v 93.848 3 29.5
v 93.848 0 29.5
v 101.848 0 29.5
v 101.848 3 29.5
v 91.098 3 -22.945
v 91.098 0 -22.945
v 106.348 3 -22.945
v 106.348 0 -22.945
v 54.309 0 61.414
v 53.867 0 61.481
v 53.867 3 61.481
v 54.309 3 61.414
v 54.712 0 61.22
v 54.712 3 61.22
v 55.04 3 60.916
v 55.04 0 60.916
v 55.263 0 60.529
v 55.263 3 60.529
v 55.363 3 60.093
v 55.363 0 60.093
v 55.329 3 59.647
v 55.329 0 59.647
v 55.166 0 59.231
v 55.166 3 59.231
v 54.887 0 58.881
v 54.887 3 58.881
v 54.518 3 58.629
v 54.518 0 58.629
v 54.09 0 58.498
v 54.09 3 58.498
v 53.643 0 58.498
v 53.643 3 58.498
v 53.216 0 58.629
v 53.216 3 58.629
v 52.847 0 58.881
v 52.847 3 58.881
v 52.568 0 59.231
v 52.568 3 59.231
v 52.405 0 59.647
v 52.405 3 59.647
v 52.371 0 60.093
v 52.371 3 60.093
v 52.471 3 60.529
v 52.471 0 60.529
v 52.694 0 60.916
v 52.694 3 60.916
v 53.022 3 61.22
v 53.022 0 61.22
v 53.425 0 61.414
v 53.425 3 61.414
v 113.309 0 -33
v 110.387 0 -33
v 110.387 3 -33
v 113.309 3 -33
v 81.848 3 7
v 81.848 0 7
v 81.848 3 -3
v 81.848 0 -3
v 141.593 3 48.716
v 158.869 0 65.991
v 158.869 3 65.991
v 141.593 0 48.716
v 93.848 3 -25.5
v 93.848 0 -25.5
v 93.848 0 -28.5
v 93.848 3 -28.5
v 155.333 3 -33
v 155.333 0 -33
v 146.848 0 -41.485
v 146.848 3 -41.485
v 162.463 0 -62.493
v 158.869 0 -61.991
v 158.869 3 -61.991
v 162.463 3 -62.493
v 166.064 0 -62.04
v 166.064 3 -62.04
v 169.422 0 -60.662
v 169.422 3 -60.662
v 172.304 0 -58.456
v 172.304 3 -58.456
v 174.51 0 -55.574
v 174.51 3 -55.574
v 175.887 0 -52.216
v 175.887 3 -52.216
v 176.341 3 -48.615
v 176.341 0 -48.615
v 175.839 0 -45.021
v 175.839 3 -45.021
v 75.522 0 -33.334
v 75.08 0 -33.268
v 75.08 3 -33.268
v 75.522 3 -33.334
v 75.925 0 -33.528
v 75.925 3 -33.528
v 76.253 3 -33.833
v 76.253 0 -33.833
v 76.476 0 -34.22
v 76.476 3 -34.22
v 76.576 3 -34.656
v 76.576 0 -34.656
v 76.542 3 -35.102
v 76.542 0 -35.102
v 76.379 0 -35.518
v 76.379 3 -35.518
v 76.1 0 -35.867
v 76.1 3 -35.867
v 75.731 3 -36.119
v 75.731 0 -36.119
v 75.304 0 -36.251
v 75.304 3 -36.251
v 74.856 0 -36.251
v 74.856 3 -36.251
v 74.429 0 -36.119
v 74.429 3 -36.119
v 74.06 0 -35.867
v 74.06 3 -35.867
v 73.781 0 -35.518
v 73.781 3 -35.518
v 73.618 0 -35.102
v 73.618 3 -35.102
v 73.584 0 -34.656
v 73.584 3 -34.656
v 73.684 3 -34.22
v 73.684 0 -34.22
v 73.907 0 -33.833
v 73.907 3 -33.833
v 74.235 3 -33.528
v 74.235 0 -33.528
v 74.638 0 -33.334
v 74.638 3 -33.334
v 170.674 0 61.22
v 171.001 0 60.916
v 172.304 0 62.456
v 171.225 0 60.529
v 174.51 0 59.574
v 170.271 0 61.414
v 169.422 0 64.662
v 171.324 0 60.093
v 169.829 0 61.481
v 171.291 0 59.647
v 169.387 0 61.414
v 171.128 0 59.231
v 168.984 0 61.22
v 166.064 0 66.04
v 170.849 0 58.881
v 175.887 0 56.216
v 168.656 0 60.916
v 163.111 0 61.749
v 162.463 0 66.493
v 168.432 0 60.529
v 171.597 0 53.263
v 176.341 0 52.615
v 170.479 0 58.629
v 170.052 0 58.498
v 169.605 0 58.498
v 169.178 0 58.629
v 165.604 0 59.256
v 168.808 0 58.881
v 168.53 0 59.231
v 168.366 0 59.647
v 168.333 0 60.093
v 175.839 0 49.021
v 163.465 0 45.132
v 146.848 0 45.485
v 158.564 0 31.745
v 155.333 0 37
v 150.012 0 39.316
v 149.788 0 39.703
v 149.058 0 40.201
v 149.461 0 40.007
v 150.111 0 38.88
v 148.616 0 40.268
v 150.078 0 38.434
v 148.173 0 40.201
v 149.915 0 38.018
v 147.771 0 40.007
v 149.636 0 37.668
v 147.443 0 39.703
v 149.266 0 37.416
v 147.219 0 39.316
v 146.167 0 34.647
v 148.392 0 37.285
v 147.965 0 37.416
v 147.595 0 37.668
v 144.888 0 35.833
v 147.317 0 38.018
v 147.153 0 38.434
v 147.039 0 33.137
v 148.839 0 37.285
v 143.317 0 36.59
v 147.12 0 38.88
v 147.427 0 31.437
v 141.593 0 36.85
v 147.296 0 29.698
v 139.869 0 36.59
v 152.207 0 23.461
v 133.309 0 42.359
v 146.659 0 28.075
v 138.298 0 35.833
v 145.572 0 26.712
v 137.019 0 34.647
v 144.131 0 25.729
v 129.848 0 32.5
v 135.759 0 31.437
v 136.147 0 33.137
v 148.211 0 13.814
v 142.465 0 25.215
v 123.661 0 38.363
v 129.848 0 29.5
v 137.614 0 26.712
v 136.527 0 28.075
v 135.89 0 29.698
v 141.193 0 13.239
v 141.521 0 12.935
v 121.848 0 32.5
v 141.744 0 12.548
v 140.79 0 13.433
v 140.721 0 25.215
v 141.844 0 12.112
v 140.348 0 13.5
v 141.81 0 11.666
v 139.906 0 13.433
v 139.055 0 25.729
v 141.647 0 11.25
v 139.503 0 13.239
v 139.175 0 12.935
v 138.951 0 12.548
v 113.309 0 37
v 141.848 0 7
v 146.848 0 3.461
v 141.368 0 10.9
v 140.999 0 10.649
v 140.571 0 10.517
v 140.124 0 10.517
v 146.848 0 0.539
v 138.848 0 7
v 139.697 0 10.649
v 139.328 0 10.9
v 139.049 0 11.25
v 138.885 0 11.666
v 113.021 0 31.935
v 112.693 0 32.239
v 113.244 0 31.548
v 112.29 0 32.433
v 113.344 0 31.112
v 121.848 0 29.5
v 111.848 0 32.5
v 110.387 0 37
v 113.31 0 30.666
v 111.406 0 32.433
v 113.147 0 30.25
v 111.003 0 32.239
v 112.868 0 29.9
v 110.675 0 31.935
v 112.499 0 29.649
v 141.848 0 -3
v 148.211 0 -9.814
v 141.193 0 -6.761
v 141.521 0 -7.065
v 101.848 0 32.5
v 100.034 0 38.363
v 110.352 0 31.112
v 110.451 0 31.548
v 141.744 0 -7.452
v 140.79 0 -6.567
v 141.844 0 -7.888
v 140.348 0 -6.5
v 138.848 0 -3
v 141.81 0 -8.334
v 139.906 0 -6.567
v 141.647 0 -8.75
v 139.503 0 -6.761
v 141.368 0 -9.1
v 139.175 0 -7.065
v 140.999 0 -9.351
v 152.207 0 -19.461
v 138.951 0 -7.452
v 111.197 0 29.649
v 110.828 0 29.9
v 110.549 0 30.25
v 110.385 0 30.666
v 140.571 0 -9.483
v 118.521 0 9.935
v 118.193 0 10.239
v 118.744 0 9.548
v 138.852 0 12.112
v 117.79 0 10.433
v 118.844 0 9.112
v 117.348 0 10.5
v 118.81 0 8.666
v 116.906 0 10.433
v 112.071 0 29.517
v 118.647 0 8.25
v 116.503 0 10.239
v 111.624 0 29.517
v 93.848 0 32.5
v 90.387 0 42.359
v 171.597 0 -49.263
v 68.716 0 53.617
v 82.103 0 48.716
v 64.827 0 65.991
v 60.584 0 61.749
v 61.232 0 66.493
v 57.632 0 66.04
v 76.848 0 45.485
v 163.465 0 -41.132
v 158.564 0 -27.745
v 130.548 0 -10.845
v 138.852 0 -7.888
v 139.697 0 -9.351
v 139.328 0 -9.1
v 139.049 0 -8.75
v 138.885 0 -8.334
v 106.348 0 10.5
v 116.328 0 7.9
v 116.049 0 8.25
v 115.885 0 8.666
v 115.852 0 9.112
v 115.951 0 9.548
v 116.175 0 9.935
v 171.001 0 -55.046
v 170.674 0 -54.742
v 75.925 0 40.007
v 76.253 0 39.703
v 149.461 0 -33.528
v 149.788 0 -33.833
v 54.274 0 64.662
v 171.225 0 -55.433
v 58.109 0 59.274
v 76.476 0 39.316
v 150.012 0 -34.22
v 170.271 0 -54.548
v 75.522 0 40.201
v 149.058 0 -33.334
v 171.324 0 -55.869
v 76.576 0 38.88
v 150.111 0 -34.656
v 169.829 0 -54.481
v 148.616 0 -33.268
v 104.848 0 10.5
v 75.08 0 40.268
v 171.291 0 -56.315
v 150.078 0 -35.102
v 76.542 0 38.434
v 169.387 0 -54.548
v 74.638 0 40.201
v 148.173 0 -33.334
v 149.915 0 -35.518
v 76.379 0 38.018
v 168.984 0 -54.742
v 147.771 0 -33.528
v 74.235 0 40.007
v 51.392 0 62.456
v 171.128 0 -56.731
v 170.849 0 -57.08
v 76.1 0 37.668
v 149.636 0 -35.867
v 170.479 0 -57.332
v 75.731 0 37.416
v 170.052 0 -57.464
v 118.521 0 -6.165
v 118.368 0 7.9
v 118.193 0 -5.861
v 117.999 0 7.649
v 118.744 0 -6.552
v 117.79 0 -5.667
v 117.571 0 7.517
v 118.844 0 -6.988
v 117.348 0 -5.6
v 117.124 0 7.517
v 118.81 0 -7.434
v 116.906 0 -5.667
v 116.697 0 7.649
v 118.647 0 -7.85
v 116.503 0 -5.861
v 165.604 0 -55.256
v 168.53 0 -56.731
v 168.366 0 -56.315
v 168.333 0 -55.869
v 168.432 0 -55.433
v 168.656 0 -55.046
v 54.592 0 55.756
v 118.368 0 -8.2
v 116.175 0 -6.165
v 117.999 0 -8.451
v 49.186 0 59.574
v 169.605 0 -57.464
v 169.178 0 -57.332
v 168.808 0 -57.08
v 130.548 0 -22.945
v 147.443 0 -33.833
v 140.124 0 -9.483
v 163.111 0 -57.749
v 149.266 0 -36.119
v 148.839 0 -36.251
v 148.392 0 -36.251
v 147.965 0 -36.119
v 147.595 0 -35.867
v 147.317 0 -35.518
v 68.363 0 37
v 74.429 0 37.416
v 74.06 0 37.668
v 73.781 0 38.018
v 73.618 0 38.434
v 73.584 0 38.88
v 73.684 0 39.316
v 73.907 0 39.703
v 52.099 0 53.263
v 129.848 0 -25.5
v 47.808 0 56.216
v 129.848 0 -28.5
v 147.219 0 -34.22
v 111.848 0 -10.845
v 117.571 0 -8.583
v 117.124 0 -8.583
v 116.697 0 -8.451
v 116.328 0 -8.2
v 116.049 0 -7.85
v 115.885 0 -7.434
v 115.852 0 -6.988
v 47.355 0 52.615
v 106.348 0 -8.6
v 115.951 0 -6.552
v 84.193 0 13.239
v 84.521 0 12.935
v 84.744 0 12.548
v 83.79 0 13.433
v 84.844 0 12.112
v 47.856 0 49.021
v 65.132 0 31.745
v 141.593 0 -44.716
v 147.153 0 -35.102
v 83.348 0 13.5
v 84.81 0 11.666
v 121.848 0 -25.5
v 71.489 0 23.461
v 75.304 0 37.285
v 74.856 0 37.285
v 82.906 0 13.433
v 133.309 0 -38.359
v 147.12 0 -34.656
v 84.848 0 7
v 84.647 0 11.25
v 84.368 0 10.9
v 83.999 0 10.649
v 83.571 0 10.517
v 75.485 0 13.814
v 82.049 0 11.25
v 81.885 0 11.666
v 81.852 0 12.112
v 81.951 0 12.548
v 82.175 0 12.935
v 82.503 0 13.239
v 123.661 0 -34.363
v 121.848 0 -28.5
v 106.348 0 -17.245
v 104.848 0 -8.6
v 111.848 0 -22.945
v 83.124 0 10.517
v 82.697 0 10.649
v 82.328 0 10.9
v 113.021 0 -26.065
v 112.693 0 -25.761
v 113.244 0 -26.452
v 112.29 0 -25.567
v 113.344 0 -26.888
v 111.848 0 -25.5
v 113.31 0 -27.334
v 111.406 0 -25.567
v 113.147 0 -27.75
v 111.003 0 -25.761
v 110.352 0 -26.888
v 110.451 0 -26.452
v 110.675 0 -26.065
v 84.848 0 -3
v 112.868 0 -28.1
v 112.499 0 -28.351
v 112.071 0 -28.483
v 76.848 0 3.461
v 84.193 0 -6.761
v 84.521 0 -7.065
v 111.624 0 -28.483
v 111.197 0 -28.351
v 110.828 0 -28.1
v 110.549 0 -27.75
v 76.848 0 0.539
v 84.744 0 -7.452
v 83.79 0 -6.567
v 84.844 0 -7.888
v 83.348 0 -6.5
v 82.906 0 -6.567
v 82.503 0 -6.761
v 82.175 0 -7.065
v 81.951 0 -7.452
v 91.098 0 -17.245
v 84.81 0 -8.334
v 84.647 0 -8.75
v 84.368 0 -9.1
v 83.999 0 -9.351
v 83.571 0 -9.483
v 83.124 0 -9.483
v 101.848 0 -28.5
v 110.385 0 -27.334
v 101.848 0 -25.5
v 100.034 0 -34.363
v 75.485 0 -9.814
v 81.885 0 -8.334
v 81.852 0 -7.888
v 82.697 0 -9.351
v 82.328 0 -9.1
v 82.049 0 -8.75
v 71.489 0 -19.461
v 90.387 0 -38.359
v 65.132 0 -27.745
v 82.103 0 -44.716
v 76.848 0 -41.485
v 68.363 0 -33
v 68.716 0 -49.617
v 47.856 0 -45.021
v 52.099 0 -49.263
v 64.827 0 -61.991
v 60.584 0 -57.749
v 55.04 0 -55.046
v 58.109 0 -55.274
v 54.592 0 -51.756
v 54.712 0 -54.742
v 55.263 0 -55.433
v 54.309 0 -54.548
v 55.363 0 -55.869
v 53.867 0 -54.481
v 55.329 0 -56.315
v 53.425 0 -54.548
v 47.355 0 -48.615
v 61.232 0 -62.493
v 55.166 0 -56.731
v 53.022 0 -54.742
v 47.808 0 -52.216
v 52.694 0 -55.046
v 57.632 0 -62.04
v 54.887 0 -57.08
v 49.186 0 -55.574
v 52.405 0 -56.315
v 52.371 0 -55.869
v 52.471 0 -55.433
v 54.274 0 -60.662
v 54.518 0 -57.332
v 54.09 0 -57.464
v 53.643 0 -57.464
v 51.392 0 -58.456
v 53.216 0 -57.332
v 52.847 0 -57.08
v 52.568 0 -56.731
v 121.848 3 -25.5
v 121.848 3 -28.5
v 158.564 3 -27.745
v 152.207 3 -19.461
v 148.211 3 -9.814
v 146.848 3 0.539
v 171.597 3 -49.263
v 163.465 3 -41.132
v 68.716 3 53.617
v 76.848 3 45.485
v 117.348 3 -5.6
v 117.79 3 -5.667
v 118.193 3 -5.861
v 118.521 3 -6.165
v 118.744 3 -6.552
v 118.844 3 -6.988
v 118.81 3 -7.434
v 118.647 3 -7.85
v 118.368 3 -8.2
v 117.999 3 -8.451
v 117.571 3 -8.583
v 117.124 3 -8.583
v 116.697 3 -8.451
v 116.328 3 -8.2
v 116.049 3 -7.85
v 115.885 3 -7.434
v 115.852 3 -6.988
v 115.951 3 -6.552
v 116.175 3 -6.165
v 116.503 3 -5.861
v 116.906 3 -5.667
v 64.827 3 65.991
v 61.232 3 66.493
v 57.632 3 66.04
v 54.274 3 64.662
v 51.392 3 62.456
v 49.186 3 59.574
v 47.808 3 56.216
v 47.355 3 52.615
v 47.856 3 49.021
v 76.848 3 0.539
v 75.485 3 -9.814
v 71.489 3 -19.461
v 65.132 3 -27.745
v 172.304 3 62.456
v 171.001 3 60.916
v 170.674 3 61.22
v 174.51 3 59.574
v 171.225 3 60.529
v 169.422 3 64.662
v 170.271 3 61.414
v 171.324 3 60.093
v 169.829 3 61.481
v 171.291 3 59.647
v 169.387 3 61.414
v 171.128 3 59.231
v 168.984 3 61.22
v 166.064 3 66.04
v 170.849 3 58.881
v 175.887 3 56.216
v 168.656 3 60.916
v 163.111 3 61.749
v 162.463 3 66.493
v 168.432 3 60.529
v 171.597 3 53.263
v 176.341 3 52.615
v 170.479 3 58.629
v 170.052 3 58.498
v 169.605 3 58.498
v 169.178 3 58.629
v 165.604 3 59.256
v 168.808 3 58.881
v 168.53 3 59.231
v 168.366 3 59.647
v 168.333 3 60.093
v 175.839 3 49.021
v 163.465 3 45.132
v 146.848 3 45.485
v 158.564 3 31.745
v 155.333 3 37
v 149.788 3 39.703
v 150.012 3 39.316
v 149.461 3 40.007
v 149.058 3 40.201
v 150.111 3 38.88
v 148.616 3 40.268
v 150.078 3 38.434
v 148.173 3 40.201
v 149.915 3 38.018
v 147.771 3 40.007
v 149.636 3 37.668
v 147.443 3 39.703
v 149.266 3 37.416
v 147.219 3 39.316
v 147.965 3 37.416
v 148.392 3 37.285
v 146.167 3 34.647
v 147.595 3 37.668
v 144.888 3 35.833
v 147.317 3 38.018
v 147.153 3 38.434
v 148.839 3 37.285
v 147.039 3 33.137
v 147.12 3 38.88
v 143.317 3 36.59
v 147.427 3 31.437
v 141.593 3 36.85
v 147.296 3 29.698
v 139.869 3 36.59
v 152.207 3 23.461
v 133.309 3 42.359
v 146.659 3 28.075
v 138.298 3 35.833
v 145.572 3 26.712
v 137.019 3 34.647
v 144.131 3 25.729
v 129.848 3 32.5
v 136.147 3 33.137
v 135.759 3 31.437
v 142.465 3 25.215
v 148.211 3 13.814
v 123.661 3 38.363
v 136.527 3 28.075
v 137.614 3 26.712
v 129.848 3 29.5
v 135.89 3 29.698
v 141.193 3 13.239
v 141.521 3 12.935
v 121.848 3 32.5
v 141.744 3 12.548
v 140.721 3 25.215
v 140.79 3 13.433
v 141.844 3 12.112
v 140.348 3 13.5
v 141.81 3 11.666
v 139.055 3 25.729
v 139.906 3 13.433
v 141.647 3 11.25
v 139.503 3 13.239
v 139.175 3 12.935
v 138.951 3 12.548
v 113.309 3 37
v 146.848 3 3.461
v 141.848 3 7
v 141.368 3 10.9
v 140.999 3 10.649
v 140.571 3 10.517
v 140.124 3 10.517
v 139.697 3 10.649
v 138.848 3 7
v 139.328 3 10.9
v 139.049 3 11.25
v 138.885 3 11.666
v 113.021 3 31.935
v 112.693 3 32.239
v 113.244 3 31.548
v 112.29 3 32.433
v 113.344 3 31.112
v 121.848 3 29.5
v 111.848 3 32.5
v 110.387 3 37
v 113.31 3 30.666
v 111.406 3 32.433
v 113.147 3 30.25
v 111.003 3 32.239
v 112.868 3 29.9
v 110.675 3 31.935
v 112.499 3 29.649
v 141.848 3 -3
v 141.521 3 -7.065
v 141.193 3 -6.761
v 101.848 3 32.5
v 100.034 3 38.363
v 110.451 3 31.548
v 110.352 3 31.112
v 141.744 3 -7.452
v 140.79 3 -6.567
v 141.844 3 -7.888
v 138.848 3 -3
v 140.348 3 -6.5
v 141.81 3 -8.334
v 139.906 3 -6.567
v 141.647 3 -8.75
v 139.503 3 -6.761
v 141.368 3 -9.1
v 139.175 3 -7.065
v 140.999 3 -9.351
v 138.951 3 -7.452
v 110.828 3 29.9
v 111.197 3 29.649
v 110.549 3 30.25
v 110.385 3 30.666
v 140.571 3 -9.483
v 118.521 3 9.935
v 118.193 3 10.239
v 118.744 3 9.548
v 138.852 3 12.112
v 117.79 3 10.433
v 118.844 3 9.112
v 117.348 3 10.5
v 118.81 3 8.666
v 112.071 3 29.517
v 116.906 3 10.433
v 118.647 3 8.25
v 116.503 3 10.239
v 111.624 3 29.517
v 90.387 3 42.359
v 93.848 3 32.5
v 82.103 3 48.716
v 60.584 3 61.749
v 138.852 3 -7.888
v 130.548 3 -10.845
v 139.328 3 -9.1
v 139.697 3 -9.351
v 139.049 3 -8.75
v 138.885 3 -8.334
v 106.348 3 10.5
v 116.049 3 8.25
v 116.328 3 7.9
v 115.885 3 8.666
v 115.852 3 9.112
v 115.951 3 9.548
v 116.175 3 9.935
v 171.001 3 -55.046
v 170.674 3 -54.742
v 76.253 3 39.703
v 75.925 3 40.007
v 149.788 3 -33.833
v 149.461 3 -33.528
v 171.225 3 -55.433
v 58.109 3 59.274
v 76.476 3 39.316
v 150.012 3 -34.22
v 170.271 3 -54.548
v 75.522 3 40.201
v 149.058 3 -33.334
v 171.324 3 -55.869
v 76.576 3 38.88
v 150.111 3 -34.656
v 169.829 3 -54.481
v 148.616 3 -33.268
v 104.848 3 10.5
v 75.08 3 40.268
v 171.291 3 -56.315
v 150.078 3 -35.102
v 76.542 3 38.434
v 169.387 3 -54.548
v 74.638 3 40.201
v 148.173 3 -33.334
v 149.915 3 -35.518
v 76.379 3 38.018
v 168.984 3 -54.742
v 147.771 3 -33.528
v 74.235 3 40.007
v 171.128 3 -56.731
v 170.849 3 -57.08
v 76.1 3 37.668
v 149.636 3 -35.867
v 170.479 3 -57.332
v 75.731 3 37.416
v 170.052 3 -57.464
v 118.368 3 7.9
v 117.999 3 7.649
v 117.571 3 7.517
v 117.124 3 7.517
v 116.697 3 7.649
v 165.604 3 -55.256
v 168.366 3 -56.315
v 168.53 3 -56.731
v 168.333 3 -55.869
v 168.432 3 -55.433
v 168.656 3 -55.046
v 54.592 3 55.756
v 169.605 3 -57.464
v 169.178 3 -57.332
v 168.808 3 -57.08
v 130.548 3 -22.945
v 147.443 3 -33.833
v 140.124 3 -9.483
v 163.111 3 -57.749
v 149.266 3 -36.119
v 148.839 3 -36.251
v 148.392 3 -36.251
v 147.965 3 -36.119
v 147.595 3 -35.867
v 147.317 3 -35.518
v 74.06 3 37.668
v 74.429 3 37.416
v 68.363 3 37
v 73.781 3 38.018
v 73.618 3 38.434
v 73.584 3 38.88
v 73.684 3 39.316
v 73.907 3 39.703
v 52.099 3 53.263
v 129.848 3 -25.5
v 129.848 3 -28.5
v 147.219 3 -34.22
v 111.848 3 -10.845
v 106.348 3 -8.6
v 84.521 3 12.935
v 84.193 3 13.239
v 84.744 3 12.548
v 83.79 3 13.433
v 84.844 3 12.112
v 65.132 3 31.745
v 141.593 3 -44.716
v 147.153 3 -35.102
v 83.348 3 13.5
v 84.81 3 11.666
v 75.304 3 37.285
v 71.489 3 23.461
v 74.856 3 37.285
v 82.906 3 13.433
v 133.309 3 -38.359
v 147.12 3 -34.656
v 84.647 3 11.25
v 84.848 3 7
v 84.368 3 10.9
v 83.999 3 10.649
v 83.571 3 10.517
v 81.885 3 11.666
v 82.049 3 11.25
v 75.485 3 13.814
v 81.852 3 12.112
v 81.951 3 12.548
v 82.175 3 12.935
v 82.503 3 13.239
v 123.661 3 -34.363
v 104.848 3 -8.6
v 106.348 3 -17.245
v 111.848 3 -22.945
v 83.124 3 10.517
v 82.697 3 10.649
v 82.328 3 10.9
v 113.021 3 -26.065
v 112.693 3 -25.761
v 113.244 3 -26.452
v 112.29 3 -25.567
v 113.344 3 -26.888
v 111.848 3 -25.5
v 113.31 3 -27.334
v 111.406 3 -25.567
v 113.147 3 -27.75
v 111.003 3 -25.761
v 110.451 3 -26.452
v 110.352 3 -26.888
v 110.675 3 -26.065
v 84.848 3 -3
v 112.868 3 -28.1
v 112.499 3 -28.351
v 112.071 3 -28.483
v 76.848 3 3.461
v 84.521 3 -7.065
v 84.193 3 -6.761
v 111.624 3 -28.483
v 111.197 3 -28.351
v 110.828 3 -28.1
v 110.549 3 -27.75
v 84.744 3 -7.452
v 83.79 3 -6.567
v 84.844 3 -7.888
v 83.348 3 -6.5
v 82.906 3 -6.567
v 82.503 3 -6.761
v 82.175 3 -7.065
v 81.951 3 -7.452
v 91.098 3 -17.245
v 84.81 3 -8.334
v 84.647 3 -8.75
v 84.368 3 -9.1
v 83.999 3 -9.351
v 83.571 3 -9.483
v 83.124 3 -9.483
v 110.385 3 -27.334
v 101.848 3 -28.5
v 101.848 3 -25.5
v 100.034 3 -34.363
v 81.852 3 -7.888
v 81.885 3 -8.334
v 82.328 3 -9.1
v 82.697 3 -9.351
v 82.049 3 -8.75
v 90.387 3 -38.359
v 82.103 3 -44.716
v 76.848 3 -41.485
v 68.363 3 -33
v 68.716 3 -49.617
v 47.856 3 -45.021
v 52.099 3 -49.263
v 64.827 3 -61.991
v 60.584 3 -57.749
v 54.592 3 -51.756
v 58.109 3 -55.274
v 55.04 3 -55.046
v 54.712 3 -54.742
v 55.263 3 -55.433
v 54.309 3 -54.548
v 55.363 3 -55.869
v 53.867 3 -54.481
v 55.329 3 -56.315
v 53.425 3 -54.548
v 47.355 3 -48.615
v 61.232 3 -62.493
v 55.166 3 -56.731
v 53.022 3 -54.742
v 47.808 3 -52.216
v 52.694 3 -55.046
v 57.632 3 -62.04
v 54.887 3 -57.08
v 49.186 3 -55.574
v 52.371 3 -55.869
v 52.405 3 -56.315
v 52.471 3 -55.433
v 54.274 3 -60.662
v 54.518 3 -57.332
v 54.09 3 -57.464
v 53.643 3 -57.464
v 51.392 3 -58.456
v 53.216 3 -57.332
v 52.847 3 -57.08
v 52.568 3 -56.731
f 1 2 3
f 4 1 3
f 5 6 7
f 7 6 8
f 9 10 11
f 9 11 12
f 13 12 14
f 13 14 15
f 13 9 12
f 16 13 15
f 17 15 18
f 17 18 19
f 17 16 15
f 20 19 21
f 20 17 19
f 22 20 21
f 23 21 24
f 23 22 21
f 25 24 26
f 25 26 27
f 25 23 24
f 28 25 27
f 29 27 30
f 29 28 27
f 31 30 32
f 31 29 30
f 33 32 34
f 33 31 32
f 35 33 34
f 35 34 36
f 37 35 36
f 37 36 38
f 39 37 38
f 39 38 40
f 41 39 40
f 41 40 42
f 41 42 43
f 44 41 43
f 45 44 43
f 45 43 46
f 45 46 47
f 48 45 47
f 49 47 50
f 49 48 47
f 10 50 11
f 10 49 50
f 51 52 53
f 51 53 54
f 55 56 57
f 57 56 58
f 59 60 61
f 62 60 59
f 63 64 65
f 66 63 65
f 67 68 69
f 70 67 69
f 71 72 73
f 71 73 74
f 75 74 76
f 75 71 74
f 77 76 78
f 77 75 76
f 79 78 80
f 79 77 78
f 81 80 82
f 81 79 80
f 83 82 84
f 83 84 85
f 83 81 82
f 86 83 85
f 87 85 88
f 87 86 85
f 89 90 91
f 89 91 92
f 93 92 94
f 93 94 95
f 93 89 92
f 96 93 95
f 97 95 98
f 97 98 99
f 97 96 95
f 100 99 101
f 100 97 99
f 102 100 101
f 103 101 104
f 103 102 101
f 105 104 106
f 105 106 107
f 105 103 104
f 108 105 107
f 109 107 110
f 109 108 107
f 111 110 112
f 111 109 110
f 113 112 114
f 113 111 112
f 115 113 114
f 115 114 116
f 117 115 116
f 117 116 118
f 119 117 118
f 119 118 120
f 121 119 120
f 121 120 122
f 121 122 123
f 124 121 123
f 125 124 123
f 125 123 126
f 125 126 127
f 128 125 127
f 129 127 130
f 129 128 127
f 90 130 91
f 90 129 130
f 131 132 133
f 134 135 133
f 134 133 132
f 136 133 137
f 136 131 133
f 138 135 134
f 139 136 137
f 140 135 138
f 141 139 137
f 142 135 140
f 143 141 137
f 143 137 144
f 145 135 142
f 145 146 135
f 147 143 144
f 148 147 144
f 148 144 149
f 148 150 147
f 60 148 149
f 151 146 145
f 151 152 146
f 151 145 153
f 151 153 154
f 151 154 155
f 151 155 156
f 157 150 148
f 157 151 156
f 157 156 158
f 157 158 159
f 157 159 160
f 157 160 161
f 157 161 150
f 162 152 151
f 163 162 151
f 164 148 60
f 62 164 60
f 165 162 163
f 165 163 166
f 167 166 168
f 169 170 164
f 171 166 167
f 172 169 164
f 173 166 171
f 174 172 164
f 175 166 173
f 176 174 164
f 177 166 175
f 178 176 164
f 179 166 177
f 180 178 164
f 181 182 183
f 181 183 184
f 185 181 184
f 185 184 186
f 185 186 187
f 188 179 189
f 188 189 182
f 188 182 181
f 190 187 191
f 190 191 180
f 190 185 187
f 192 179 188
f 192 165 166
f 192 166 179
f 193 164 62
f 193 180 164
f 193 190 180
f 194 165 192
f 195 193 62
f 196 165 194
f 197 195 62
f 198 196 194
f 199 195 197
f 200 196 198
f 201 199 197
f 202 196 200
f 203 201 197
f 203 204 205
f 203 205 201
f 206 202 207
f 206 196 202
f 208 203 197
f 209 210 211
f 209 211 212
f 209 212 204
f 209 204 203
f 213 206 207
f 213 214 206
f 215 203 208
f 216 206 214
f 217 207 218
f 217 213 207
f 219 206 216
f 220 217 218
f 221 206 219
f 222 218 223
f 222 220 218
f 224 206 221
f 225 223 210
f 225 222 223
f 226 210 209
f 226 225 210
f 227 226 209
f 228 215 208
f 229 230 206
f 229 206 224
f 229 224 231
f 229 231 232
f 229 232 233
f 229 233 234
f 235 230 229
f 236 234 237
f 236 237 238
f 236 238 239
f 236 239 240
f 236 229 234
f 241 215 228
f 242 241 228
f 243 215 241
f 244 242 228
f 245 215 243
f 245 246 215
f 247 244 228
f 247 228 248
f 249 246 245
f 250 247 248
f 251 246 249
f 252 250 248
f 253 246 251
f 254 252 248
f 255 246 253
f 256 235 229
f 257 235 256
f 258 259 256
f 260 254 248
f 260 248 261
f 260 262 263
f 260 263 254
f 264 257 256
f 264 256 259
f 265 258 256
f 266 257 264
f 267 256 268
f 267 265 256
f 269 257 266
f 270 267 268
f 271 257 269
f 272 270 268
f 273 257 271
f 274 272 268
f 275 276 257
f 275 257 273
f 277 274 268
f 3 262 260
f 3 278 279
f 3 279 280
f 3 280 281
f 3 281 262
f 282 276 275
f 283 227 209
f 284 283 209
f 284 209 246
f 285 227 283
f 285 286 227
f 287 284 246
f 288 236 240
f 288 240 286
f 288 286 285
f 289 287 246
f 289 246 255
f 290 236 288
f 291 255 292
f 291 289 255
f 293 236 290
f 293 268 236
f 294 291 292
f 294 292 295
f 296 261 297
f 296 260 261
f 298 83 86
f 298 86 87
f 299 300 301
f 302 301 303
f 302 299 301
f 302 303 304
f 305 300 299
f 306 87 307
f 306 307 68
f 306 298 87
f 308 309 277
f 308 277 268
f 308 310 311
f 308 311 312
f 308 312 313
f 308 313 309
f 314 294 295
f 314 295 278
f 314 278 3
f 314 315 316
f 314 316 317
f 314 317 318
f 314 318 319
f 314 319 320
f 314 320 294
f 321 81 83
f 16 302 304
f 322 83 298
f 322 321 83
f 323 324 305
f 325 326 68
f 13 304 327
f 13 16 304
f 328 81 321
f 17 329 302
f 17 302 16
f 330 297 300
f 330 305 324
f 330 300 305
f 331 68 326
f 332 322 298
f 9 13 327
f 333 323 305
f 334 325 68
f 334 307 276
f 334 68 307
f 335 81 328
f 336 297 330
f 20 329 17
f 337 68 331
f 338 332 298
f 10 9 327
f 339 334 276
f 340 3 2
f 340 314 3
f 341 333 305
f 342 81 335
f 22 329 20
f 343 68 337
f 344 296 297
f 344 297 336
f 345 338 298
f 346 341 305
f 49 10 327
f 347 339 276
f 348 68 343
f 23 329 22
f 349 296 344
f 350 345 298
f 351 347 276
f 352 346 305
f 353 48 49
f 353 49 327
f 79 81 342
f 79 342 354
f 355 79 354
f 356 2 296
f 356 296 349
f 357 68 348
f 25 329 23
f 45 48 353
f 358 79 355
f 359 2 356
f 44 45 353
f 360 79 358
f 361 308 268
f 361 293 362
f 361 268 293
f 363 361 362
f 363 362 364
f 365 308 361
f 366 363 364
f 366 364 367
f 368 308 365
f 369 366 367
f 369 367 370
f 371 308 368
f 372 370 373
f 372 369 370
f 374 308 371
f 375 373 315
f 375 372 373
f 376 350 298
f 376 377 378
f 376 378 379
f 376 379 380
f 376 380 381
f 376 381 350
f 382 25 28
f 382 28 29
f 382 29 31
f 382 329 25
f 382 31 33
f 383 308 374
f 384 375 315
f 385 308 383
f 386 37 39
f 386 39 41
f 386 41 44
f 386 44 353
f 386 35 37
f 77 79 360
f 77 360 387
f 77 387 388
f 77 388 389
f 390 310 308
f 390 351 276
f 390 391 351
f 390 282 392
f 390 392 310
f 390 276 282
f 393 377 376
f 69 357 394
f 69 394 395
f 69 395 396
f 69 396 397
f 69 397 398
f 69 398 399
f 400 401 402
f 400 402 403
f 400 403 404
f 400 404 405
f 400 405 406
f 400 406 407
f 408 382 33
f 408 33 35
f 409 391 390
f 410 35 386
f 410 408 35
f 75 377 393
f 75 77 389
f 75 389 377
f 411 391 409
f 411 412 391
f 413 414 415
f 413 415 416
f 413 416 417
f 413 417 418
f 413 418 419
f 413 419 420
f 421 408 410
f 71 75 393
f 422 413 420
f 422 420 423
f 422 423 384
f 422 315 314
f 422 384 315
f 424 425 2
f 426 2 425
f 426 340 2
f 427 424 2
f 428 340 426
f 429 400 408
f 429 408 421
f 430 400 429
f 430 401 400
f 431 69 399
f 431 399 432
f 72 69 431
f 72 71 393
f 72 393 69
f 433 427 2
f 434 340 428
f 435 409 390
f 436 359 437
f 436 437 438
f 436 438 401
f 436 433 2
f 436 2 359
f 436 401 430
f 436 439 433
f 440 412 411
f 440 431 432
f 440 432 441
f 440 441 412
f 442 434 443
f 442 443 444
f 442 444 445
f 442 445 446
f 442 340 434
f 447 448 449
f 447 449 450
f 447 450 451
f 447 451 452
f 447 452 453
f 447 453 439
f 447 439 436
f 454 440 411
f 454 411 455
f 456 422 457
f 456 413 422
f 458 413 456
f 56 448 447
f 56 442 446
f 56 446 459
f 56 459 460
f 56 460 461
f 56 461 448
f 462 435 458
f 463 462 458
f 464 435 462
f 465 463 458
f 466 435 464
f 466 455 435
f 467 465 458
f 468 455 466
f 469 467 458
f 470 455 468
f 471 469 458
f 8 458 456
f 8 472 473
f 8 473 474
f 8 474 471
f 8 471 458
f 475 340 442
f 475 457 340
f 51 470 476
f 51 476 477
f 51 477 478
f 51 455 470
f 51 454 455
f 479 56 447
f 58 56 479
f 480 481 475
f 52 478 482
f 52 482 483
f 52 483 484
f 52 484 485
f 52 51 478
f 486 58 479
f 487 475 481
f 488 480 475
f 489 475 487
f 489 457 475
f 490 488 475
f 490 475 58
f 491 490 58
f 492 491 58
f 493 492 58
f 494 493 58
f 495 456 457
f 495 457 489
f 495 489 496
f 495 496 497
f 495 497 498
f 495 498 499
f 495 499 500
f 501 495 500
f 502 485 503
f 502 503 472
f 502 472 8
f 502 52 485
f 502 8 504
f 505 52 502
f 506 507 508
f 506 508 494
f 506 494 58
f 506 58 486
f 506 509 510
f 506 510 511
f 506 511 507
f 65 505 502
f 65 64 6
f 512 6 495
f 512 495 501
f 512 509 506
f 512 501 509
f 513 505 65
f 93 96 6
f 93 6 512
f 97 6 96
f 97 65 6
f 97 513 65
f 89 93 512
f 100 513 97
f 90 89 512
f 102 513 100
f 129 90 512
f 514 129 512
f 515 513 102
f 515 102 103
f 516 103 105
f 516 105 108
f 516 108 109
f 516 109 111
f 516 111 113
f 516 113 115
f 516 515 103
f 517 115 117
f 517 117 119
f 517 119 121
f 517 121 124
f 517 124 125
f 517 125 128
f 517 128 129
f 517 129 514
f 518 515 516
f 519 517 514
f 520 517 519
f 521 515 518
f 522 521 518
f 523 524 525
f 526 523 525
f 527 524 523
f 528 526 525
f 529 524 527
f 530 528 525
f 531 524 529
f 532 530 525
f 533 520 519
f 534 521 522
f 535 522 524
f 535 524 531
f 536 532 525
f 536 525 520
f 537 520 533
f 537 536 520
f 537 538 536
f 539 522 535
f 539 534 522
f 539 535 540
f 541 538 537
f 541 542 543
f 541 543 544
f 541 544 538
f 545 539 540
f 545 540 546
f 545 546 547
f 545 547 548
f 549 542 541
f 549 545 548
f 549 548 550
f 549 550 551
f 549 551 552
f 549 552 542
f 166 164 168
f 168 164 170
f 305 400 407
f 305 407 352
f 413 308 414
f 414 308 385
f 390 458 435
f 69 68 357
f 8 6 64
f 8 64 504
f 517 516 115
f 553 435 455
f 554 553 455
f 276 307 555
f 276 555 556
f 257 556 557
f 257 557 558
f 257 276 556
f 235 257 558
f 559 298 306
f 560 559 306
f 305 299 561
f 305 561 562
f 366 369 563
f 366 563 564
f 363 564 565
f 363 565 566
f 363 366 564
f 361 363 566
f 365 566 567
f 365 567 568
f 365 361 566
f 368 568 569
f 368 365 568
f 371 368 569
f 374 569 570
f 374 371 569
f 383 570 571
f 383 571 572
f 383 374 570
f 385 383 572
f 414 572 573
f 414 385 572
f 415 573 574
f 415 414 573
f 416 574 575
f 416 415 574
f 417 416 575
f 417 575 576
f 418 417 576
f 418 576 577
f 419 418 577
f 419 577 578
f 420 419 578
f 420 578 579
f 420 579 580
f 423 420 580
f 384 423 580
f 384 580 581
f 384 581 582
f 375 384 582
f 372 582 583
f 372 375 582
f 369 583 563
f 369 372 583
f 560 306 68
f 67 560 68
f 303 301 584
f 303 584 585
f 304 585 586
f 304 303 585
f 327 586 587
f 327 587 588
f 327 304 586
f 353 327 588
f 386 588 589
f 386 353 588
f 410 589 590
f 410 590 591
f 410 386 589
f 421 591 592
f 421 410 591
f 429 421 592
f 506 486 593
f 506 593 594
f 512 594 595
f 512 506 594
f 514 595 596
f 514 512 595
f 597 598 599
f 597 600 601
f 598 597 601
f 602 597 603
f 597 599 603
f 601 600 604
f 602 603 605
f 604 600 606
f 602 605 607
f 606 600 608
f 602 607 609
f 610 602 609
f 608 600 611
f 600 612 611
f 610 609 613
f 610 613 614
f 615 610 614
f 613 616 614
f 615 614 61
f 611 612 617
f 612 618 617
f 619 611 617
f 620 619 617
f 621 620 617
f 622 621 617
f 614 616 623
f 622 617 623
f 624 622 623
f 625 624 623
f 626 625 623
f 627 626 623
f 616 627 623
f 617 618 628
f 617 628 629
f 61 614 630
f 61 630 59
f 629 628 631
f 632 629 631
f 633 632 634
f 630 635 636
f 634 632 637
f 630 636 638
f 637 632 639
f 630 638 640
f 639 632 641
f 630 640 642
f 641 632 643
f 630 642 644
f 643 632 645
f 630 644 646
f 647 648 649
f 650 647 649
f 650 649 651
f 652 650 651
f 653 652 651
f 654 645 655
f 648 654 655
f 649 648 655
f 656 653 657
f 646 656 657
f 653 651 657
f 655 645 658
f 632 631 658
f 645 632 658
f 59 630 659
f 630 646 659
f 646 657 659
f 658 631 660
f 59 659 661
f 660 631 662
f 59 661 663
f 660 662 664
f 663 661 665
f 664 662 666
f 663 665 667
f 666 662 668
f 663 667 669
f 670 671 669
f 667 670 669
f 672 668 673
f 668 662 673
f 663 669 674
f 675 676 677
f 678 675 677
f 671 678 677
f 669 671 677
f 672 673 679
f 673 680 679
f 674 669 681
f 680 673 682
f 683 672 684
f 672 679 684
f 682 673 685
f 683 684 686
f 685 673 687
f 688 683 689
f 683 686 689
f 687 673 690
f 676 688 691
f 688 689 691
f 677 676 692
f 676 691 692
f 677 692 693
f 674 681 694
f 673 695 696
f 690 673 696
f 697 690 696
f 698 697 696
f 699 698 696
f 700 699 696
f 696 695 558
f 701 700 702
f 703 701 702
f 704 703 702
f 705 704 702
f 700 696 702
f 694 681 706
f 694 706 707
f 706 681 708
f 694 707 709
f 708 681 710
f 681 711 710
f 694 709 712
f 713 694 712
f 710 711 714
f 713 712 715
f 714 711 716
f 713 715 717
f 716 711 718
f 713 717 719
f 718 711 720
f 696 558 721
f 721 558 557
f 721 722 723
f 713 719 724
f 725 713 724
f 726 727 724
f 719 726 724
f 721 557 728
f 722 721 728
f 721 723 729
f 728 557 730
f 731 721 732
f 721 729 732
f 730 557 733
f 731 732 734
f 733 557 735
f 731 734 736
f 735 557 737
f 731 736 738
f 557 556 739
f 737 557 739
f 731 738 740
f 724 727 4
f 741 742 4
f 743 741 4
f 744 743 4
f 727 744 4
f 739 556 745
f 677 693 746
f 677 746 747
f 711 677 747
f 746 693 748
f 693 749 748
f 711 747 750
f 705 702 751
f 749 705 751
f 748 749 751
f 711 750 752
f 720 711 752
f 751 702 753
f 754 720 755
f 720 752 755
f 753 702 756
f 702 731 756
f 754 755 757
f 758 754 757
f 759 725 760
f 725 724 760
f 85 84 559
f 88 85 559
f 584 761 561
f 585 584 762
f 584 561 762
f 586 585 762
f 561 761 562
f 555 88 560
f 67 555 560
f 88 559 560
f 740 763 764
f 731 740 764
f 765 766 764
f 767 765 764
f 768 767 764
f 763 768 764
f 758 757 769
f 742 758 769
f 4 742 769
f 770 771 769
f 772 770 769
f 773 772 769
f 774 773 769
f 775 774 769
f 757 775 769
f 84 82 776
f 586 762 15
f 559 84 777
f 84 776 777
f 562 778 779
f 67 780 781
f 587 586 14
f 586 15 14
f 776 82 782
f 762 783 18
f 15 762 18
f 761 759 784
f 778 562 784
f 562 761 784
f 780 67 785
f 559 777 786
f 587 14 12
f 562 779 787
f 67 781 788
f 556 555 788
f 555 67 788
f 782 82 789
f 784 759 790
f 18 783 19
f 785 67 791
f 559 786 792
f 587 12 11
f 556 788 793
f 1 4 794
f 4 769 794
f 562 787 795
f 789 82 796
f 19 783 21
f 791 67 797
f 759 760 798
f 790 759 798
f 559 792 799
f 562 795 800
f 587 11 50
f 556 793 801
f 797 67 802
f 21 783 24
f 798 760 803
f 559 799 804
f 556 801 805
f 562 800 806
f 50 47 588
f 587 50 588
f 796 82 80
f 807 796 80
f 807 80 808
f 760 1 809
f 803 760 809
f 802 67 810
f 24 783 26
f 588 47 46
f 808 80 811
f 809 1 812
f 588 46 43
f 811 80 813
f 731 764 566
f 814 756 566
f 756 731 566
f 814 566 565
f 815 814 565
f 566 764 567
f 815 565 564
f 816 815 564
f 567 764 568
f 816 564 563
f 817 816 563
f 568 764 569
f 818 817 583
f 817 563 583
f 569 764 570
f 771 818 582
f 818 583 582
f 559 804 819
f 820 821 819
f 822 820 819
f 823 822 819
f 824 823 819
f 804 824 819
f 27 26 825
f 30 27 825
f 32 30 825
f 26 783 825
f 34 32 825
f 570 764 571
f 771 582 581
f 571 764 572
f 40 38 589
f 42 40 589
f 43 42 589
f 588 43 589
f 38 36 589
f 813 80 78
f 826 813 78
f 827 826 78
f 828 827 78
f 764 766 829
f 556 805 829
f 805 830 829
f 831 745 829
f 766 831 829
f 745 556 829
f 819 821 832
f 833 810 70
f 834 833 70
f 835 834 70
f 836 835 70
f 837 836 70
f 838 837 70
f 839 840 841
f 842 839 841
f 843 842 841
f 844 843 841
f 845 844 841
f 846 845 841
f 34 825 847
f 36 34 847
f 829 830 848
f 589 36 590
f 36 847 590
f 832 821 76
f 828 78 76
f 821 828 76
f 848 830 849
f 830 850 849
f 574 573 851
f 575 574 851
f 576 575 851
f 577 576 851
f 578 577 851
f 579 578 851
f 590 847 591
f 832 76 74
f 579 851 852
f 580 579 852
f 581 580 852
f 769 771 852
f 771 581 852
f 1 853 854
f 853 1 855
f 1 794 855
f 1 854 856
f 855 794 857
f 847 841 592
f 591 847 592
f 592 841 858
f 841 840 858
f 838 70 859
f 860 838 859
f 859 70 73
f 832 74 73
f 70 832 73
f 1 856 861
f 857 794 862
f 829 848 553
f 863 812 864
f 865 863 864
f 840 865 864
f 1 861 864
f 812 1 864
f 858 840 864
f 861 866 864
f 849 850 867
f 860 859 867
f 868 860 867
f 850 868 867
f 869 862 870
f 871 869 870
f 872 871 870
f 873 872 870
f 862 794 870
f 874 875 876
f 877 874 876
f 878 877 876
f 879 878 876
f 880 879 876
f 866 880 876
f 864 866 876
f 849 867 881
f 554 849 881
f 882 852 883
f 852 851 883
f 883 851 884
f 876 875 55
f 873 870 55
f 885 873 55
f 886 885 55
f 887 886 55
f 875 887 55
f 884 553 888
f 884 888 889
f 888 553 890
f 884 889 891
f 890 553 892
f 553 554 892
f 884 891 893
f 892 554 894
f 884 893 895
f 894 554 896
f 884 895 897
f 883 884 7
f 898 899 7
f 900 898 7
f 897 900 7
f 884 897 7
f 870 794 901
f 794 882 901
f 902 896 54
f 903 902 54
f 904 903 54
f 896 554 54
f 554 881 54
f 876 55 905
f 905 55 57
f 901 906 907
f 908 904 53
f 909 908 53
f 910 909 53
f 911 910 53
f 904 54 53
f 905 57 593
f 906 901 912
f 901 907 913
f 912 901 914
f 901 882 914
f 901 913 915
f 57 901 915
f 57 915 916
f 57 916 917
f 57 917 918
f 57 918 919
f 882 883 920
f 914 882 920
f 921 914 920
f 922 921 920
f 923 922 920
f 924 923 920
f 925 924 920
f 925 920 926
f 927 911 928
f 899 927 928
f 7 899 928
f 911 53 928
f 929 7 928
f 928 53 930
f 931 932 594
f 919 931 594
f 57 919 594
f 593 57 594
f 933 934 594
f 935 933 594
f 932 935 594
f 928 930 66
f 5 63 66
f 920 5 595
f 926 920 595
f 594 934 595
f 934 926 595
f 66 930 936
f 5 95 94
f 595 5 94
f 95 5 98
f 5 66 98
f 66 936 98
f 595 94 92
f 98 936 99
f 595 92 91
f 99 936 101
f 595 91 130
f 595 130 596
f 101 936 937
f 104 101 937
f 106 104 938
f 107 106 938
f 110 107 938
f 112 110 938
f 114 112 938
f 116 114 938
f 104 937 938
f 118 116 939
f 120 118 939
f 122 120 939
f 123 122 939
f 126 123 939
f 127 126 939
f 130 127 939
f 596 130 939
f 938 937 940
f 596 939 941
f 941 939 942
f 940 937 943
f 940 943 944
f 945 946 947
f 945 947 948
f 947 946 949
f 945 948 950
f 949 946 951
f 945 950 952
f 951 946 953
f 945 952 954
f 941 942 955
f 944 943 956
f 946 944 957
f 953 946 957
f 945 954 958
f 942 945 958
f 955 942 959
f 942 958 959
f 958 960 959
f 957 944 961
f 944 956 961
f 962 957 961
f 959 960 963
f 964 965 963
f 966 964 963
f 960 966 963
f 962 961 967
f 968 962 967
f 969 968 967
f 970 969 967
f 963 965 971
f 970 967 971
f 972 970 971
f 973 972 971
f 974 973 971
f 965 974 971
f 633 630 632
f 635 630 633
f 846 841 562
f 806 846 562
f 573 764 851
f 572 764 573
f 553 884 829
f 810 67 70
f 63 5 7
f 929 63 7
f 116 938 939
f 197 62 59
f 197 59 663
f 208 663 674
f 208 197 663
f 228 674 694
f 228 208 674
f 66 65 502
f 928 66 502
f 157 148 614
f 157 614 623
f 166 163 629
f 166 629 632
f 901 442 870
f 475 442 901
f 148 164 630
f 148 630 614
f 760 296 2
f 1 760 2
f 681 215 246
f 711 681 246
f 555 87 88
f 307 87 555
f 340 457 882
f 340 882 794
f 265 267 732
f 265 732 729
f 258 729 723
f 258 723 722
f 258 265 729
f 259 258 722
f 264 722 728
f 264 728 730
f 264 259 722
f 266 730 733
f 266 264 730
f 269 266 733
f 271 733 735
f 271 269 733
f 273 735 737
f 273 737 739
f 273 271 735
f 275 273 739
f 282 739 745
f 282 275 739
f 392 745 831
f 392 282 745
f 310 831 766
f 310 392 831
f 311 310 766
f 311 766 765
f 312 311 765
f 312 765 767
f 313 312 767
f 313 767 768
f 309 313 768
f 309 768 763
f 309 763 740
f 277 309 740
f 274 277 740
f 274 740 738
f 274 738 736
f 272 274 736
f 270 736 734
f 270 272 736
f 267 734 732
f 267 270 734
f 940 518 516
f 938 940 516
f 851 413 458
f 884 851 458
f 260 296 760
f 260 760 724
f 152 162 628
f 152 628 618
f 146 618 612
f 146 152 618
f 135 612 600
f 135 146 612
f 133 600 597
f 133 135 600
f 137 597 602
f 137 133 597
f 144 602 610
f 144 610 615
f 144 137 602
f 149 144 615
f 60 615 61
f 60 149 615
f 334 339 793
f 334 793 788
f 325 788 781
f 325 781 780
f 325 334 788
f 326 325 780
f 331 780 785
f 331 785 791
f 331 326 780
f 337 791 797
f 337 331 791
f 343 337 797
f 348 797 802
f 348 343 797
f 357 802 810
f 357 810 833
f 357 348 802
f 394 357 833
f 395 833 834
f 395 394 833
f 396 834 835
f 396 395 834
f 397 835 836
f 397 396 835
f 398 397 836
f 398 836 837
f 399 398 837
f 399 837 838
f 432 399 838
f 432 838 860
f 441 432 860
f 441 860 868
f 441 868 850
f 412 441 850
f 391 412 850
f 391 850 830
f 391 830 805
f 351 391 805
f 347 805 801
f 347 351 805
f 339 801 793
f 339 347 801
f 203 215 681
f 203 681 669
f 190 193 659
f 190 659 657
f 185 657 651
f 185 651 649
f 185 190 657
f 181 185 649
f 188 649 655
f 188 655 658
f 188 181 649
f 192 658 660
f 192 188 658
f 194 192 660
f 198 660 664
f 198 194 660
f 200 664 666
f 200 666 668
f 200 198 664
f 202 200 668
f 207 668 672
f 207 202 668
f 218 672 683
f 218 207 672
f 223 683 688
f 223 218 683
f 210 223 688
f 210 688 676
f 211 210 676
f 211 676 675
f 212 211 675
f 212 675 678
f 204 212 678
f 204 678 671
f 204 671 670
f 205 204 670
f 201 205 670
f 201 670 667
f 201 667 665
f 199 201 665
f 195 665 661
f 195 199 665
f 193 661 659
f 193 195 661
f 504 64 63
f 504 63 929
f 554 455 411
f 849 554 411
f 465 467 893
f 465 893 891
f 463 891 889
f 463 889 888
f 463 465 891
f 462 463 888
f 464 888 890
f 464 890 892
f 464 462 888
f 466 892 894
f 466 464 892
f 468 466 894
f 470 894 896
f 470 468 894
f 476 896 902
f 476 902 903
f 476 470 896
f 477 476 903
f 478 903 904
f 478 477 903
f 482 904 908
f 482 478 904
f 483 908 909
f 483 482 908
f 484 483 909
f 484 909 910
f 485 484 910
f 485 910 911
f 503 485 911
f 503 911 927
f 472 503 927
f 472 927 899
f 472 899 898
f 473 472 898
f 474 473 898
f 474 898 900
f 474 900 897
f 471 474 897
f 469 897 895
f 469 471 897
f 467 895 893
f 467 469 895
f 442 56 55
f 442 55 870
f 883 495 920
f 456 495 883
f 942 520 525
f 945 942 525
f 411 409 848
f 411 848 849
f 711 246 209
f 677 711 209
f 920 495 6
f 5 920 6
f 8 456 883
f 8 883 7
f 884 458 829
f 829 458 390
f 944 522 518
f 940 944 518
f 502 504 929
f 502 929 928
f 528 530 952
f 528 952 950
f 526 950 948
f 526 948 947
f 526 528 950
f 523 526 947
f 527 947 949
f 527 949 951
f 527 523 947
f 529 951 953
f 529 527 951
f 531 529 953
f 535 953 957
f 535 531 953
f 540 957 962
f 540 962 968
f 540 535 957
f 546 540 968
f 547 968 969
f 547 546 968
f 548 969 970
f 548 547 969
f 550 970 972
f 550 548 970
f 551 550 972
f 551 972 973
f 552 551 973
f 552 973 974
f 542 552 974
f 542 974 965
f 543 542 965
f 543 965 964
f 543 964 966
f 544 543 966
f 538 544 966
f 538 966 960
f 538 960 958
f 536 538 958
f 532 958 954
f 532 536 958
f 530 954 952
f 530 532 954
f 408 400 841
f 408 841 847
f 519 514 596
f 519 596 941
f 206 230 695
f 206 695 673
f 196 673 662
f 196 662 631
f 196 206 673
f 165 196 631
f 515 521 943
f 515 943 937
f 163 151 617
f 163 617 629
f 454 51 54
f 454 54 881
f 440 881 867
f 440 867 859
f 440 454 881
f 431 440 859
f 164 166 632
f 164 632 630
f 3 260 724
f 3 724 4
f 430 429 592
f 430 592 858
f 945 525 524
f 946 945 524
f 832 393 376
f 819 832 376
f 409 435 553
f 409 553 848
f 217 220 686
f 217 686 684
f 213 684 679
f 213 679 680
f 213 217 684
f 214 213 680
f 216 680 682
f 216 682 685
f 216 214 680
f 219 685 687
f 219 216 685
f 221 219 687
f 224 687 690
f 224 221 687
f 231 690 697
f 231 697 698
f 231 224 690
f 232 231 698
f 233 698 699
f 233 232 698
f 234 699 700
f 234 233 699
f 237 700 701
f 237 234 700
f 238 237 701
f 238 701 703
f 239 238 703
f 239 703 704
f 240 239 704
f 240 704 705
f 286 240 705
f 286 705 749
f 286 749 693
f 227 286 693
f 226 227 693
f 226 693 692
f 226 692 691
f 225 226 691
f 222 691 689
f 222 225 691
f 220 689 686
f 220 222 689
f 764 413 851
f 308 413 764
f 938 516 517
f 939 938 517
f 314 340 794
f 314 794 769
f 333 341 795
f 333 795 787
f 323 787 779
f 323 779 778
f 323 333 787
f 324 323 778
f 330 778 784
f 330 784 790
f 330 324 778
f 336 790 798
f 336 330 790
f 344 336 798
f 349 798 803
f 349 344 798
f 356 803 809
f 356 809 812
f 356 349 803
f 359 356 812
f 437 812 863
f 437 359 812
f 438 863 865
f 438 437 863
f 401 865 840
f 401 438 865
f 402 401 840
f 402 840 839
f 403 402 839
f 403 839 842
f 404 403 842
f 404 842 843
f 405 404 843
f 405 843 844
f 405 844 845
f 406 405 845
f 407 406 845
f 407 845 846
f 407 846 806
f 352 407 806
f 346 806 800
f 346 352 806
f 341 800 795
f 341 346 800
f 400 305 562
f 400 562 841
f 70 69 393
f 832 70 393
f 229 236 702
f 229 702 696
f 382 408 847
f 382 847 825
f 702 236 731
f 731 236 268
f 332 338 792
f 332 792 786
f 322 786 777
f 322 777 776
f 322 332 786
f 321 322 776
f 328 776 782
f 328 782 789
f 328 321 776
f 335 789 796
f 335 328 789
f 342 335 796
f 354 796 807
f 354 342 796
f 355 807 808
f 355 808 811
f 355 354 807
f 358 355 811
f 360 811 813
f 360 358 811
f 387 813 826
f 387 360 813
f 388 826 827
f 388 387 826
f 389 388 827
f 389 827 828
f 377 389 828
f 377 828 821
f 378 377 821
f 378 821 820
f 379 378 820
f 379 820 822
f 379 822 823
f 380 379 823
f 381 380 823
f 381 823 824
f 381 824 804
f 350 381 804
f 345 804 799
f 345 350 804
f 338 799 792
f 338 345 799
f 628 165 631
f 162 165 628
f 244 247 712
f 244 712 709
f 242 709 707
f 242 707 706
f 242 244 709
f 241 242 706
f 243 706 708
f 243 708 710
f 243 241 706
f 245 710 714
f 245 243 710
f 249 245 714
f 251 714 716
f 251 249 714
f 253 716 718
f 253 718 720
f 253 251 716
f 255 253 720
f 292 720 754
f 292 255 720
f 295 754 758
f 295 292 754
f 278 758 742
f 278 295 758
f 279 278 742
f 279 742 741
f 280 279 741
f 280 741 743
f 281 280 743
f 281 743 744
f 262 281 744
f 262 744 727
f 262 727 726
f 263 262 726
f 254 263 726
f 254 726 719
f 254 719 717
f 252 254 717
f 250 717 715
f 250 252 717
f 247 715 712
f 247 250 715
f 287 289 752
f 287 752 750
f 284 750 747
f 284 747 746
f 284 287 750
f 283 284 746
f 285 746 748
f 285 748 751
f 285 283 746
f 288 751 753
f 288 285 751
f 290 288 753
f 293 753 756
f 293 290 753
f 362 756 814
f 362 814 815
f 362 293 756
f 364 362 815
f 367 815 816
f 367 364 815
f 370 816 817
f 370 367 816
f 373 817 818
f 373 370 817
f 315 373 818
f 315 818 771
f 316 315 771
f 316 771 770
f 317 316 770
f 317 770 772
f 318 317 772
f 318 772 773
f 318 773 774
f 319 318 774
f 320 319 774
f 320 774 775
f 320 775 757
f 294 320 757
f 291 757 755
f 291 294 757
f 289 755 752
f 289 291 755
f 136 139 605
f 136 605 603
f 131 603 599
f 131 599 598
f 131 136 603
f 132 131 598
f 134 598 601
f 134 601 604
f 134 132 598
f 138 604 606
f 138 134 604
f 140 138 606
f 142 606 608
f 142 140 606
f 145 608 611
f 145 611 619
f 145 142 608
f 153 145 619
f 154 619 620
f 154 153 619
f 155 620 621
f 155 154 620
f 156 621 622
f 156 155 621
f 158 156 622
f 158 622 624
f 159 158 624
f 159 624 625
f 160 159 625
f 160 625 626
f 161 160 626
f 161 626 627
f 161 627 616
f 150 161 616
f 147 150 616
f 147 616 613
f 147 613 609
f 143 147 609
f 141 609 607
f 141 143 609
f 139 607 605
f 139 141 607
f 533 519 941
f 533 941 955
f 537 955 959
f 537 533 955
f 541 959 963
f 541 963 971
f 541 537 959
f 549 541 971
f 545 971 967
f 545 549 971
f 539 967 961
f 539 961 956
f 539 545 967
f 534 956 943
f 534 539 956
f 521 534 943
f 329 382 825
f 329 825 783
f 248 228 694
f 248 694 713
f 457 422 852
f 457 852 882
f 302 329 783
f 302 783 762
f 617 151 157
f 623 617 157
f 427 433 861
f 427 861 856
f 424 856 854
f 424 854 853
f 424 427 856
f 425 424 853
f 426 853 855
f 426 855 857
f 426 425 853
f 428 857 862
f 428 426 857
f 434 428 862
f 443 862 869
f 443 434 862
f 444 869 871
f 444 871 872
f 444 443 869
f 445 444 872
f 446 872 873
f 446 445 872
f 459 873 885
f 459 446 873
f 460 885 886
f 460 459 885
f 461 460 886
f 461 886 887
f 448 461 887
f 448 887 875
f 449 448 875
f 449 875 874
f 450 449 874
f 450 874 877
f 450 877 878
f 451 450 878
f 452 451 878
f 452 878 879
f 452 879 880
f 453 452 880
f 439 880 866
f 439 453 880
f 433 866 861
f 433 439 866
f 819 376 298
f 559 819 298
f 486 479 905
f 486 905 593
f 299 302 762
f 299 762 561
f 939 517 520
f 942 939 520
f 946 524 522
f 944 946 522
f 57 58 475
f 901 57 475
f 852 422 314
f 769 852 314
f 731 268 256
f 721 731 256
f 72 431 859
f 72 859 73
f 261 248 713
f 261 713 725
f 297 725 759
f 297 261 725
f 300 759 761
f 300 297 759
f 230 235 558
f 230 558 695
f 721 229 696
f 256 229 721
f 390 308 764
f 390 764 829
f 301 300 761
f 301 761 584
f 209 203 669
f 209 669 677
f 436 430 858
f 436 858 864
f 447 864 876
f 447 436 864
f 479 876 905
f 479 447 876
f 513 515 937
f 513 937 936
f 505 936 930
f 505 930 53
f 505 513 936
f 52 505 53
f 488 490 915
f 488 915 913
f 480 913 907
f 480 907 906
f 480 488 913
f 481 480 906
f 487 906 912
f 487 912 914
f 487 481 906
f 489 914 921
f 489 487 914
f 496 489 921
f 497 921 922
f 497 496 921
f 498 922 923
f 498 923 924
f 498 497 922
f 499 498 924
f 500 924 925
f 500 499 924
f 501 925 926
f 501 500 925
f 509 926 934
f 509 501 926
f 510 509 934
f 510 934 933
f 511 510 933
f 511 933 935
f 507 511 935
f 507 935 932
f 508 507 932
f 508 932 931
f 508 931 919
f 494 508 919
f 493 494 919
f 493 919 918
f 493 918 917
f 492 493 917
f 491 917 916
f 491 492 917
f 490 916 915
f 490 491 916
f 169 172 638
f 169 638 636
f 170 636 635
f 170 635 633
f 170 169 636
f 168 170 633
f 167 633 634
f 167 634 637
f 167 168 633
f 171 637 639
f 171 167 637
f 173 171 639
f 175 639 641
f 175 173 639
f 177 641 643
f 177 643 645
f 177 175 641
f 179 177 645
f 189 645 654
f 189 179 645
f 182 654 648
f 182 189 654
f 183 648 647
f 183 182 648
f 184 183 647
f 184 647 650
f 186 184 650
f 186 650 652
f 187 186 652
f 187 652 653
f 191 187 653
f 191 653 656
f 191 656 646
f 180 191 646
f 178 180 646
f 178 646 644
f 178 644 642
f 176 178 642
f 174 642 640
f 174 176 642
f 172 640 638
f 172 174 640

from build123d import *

# Parameters (mm, degrees)
ESBO_O1_R                = 1.5
ESBO_O1_R_2              = 5.85
ESBO_O1_W                = 3
ESBO_O1_H                = 10
ESBO_O1_W_2              = 8
ESBO_O1_H_2              = 3
ESBO_O1_W_3              = 15.25
ESBO_O1_H_3              = 5.7
ESBO_O1_W_4              = 18.7
ESBO_O1_H_4              = 12.1
RESSALTO_EXTRUS_O1_DEPTH = 3


with BuildPart() as part:
    # Esboço1 → Ressalto-extrusão1 (new body)
    with BuildSketch(Plane(origin=(0, 0, 0), x_dir=(1, 0, 0), z_dir=(0, 1, 0))):
        with BuildLine():
            Line((110.386890532, 33), (113.308680045, 33))
            ThreePointArc((113.308680045, 33), (128.61601734, 36.0448187), (141.592951292, 44.715728753))
            Line((141.592951292, 44.715728753), (158.868600568, 61.991378029))
            ThreePointArc((158.868600568, 61.991378029), (172.303629411, 58.455844123), (175.839163317, 45.02081528))
            Line((175.839163317, 45.02081528), (158.563514041, 27.745166004))
            ThreePointArc((158.563514041, 27.745166004), (149.892603988, 14.768232051), (146.847785288, -0.539105243))
            Line((146.847785288, -0.539105243), (146.847785288, -3.460894757))
            ThreePointArc((146.847785288, -3.460894757), (149.892603988, -18.768232051), (158.563514041, -31.745166004))
            Line((158.563514041, -31.745166004), (175.839163317, -49.02081528))
            ThreePointArc((175.839163317, -49.02081528), (172.303629411, -62.455844123), (158.868600568, -65.991378029))
            Line((158.868600568, -65.991378029), (141.592951292, -48.715728753))
            ThreePointArc((141.592951292, -48.715728753), (128.61601734, -40.0448187), (113.308680045, -37))
            Line((113.308680045, -37), (110.386890532, -37))
            ThreePointArc((110.386890532, -37), (95.079553237, -40.0448187), (82.102619284, -48.715728753))
            Line((82.102619284, -48.715728753), (64.826970008, -65.991378029))
            ThreePointArc((64.826970008, -65.991378029), (51.391941166, -62.455844123), (47.85640726, -49.02081528))
            Line((47.85640726, -49.02081528), (65.132056536, -31.745166004))
            ThreePointArc((65.132056536, -31.745166004), (73.802966589, -18.768232051), (76.847785288, -3.460894757))
            Line((76.847785288, -3.460894757), (76.847785288, -0.539105243))
            ThreePointArc((76.847785288, -0.539105243), (73.802966589, 14.768232051), (65.132056536, 27.745166004))
            Line((65.132056536, 27.745166004), (47.85640726, 45.02081528))
            ThreePointArc((47.85640726, 45.02081528), (51.391941166, 58.455844123), (64.826970008, 61.991378029))
            Line((64.826970008, 61.991378029), (82.102619284, 44.715728753))
            ThreePointArc((82.102619284, 44.715728753), (95.079553237, 36.0448187), (110.386890532, 33))
        make_face()
        with Locations(Location((111.847785288, 27, 0), (0, 0, 270))):
            Circle(ESBO_O1_R, mode=Mode.SUBTRACT)
        with Locations(Location((111.847785288, -31, 0), (0, 0, 270))):
            Circle(ESBO_O1_R, mode=Mode.SUBTRACT)
        with Locations(Location((169.828664477, -59.980879188, 0), (0, 0, 270))):
            Circle(ESBO_O1_R, mode=Mode.SUBTRACT)
        with Locations(Location((148.615552241, -38.767766953, 0), (0, 0, 270))):
            Circle(ESBO_O1_R, mode=Mode.SUBTRACT)
        with Locations(Location((148.615552241, 34.767766953, 0), (0, 0, 270))):
            Circle(ESBO_O1_R, mode=Mode.SUBTRACT)
        with Locations(Location((169.828664477, 55.980879188, 0), (0, 0, 270))):
            Circle(ESBO_O1_R, mode=Mode.SUBTRACT)
        with Locations(Location((75.080018335, 34.767766953, 0), (0, 0, 270))):
            Circle(ESBO_O1_R, mode=Mode.SUBTRACT)
        with Locations(Location((53.8669061, 55.980879188, 0), (0, 0, 270))):
            Circle(ESBO_O1_R, mode=Mode.SUBTRACT)
        with Locations(Location((117.347785288, 7.1, 0), (0, 0, 270))):
            Circle(ESBO_O1_R, mode=Mode.SUBTRACT)
        with Locations(Location((53.8669061, -59.980879188, 0), (0, 0, 270))):
            Circle(ESBO_O1_R, mode=Mode.SUBTRACT)
        with Locations(Location((75.080018335, -38.767766953, 0), (0, 0, 270))):
            Circle(ESBO_O1_R, mode=Mode.SUBTRACT)
        with Locations(Location((117.347785288, -9, 0), (0, 0, 270))):
            Circle(ESBO_O1_R, mode=Mode.SUBTRACT)
        with Locations(Location((83.347785288, 8, 0), (0, 0, 270))):
            Circle(ESBO_O1_R, mode=Mode.SUBTRACT)
        with Locations(Location((83.347785288, -12, 0), (0, 0, 270))):
            Circle(ESBO_O1_R, mode=Mode.SUBTRACT)
        with Locations(Location((140.347785288, 8, 0), (0, 0, 270))):
            Circle(ESBO_O1_R, mode=Mode.SUBTRACT)
        with Locations(Location((140.347785288, -12, 0), (0, 0, 270))):
            Circle(ESBO_O1_R, mode=Mode.SUBTRACT)
        with Locations(Location((141.592951292, -31, 0), (0, 0, 270))):
            Circle(ESBO_O1_R_2, mode=Mode.SUBTRACT)
        with Locations((83.347785288, -2)):
            Rectangle(ESBO_O1_W, ESBO_O1_H, mode=Mode.SUBTRACT)
        with Locations((125.847785288, -31)):
            Rectangle(ESBO_O1_W_2, ESBO_O1_H_2, mode=Mode.SUBTRACT)
        with Locations((140.347785288, -2)):
            Rectangle(ESBO_O1_W, ESBO_O1_H, mode=Mode.SUBTRACT)
        with Locations((97.847785288, -31)):
            Rectangle(ESBO_O1_W_2, ESBO_O1_H_2, mode=Mode.SUBTRACT)
        with Locations((97.847785288, 27)):
            Rectangle(ESBO_O1_W_2, ESBO_O1_H_2, mode=Mode.SUBTRACT)
        with Locations((98.722785288, 20.094707965)):
            Rectangle(ESBO_O1_W_3, ESBO_O1_H_3, mode=Mode.SUBTRACT)
        with Locations((125.847785288, 27)):
            Rectangle(ESBO_O1_W_2, ESBO_O1_H_2, mode=Mode.SUBTRACT)
        with Locations((121.197785288, 16.894707965)):
            Rectangle(ESBO_O1_W_4, ESBO_O1_H_4, mode=Mode.SUBTRACT)
        Polygon((165.603972833, -59.256005764), (169.121648896, -55.738329701), (171.59652263, -53.263455967), (163.464794646, -45.131727984), (155.333066663, -37), (146.847785288, -45.485281374), (163.111241256, -61.748737342), align=None, mode=Mode.SUBTRACT)
        Polygon((163.464794646, 41.131727984), (155.333066663, 33), (146.847785288, 41.485281374), (163.111241256, 57.748737342), (165.603972833, 55.256005764), (169.121648896, 51.738329701), (171.59652263, 49.263455967), align=None, mode=Mode.SUBTRACT)
        Polygon((104.847785288, 8.6), (104.847785288, -10.5), (106.347785288, -10.5), (106.347785288, 7.873666298), (106.347785288, 8.6), align=None, mode=Mode.SUBTRACT)
        Polygon((68.716057305, 49.617009358), (76.847785288, 41.485281374), (68.362503914, 33), (52.099047947, 49.263455967), (54.591779524, 51.756187545), (58.109455587, 55.273863607), (60.584329321, 57.748737342), align=None, mode=Mode.SUBTRACT)
        Polygon((54.591779524, -55.756187545), (58.109455587, -59.273863607), (60.584329321, -61.748737342), (68.716057305, -53.617009358), (76.847785288, -45.485281374), (68.362503914, -37), (52.099047947, -53.263455967), align=None, mode=Mode.SUBTRACT)
    extrude(amount=RESSALTO_EXTRUS_O1_DEPTH)


solid = part.part
